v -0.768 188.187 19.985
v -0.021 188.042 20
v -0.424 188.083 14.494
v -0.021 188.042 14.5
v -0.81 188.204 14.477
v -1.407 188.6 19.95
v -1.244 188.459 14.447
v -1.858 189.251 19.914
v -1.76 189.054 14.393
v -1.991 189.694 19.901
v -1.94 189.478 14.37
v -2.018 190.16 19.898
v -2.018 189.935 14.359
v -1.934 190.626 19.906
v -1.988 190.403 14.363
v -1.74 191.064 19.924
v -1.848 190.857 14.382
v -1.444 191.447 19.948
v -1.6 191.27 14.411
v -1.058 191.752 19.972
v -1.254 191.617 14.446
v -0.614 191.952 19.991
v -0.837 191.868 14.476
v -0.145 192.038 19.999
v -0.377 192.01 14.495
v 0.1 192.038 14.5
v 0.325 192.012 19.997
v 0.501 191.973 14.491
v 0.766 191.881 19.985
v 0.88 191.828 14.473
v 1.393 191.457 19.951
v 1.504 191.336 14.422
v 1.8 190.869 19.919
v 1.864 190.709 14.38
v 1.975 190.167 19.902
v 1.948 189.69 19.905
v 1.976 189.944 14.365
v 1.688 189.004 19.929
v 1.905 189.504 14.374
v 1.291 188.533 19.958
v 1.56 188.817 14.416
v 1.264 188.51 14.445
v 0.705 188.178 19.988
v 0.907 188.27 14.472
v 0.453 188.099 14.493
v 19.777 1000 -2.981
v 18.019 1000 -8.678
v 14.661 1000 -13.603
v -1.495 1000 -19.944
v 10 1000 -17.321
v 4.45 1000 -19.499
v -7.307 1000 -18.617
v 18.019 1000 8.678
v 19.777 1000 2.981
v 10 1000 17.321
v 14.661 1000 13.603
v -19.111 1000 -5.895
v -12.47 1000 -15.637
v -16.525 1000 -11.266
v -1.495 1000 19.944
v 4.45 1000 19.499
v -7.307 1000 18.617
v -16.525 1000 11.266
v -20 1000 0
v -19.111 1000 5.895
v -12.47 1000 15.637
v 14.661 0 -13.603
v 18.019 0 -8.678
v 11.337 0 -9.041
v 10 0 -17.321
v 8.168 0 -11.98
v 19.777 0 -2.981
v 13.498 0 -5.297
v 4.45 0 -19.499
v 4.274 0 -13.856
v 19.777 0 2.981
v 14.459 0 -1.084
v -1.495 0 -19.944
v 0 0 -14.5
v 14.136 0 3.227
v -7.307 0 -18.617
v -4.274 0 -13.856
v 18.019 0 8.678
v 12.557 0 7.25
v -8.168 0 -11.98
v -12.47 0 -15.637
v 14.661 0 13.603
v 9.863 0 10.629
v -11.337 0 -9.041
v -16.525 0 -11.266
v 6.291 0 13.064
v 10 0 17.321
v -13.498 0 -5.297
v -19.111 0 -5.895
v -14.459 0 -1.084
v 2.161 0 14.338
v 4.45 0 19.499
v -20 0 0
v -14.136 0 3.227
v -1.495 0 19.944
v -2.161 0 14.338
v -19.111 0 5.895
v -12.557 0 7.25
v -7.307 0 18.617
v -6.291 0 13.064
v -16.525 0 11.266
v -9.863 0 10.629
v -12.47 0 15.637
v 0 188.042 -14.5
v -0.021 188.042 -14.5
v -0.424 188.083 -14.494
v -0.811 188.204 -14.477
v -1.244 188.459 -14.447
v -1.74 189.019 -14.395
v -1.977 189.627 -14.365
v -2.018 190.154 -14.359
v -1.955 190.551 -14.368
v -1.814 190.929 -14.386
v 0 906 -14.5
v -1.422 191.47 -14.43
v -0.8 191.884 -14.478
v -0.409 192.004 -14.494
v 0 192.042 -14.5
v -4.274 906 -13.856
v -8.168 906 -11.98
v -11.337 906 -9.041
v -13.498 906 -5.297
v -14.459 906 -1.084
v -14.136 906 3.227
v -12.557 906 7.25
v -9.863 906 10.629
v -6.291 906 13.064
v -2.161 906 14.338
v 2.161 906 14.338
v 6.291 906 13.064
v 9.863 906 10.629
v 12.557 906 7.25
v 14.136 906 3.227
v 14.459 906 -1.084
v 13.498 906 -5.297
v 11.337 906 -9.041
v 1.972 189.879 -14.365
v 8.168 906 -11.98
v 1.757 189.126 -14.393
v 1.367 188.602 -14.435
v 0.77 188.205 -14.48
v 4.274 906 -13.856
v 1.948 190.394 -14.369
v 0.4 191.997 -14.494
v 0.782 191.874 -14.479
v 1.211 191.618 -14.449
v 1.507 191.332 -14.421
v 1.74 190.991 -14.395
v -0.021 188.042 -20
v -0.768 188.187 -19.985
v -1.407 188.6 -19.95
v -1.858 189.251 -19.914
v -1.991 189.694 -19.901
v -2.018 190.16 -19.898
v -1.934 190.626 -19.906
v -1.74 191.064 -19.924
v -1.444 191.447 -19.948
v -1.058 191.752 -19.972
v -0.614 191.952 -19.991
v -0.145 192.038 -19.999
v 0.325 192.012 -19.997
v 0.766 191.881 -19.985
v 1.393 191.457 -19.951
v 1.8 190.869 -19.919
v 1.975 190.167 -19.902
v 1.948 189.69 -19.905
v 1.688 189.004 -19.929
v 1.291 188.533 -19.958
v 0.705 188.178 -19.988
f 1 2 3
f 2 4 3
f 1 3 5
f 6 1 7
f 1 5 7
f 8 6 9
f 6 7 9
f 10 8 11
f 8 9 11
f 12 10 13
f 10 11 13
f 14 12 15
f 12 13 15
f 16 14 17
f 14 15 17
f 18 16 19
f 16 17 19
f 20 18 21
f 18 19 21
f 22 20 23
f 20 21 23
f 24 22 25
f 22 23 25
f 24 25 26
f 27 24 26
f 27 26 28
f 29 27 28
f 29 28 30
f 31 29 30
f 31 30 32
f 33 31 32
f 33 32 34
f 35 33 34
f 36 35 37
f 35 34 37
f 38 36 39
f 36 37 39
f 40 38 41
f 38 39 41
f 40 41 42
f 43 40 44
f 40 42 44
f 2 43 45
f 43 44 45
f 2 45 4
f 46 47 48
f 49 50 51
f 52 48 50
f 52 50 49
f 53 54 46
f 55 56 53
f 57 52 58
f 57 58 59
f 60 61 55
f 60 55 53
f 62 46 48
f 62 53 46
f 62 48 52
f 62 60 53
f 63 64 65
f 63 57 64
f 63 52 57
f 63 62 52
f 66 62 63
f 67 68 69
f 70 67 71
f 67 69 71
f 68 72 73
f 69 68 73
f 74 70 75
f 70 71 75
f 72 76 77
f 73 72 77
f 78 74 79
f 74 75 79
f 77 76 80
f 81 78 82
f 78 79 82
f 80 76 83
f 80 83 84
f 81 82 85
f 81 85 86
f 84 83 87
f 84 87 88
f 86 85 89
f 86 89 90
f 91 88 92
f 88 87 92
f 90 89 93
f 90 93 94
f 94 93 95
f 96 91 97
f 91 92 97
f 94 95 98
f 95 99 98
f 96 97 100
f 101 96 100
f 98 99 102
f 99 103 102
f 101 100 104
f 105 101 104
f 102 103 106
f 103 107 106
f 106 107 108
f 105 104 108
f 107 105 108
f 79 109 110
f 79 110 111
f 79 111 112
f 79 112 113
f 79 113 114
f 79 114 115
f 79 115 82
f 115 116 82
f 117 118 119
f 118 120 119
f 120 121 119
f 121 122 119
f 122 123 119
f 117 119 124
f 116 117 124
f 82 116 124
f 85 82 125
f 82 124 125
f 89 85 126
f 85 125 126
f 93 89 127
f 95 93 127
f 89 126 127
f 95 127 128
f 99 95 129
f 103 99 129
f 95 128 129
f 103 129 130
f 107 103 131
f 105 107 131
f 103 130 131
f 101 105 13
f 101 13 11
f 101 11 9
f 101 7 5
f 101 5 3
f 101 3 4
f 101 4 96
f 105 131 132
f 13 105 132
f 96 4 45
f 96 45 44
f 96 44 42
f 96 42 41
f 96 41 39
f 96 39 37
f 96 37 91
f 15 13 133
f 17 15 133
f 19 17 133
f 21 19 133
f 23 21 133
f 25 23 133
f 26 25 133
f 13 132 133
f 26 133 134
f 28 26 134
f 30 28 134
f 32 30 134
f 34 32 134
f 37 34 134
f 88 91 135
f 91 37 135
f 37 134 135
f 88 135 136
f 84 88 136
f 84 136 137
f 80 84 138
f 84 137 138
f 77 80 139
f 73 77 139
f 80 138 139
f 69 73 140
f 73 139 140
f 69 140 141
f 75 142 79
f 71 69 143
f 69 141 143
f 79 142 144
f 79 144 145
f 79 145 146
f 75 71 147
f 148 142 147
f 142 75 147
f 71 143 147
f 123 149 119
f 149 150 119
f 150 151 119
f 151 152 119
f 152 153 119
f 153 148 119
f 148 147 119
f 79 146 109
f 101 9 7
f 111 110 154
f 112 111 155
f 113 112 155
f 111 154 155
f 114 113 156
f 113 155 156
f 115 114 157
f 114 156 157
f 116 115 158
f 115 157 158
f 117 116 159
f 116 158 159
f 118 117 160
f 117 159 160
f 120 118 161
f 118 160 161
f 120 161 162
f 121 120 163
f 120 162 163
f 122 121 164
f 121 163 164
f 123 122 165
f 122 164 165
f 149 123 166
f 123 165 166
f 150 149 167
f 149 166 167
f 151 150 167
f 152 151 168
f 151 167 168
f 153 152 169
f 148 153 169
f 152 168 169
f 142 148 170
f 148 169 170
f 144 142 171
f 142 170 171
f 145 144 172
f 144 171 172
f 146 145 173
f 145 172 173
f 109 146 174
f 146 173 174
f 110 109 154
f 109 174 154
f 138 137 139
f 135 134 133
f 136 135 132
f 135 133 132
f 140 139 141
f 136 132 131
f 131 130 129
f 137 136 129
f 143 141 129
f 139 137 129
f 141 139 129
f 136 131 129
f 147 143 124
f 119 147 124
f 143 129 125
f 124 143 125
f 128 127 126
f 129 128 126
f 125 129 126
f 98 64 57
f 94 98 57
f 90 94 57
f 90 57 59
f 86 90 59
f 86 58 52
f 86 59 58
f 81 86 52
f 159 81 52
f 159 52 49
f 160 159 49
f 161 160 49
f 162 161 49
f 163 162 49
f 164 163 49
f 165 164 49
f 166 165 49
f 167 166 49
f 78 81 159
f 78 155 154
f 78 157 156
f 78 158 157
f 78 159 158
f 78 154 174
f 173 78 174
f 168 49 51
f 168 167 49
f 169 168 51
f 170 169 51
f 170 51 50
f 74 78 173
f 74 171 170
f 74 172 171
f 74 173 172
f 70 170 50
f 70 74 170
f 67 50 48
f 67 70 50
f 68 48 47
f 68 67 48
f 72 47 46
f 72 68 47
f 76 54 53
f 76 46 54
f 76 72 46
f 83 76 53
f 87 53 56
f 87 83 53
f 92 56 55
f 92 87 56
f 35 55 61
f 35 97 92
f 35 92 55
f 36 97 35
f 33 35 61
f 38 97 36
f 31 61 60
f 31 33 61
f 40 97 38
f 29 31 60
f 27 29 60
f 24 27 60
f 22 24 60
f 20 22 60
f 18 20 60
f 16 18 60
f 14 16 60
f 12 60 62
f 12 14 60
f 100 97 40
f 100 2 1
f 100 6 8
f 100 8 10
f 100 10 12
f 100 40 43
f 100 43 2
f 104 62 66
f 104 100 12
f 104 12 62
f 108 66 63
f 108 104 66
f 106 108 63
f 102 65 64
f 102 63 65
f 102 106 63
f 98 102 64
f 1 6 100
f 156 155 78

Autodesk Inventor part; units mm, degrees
ref_plane "YZ Plane" through (0, 0, 0) normal (1, 0, 0) x (0, 1, 0)
ref_plane "XZ Plane" through (0, 0, 0) normal (0, 1, 0) x (-1, 0, 0)
ref_plane "XY Plane" through (0, 0, 0) normal (0, 0, 1) x (1, 0, 0)
sketch "Sketch1" plane through (0, 0, 0) normal (0, 1, 0) x (-1, 0, 0)
  circle A0 centre (0, 0) radius 20
  dimension "d0" = 40
extrude "Extrusion1" add sketch "Sketch1" along normal blind 1000
sketch "Sketch2" plane through (0, 0, 0) normal (0, 0, 1) x (1, 0, 0)
  circle A0 centre (0, 190.0543) radius 1.5
  point P0 (0, 0)
  dimension "d3" = 3
extrude "Extrusion2" add sketch "Sketch2" along normal blind 25 and the other way blind 25
sketch "Sketch3" plane through (0, 190.0543, 25) normal (0, 0, 1) x (1, 0, 0)
  point P0 (0, -190.0543)
  point P1 (-0.0211, -0.0123)
hole "Hole1" at (-0.0211, 190.042, 25) direction (0, 0, -1) diameter 4 depth 51
sketch "Sketch4" plane through (0, 0, 0) normal (0, -1, 0) x (1, 0, 0)
  point P0 (0, 0)
  point P1 (0, 0)
hole "Hole2" at (0, 0, 0) direction (0, 1, 0) diameter 29 depth 906
thread "Thread2" size "M40x3" class "6g" standard "ANSI Metric M Profile" length 40
thread "Thread3" size "M40x3" class "6g" standard "ANSI Metric M Profile" length 100
properties part number "Tongkatttt" material "Aluminum 6061-AHC"
